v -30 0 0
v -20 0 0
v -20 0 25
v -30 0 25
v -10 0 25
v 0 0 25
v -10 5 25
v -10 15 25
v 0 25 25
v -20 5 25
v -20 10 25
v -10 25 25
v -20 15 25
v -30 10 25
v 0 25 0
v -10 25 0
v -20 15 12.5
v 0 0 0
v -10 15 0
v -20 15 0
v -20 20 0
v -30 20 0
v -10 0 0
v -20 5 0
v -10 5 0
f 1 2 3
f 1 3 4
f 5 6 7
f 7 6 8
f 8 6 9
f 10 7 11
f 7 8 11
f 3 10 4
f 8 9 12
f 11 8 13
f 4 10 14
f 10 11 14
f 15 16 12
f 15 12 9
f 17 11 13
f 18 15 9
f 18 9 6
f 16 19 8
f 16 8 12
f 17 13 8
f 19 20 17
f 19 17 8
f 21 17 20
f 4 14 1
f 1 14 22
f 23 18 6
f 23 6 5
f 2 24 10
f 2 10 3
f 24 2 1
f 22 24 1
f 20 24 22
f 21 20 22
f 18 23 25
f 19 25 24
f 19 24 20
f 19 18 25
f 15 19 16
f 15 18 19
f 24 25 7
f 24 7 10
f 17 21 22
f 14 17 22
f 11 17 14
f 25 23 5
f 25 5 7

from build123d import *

# Parameters (mm, degrees)
BOSS_EXTRUDE1_DEPTH = 25
BOSS_EXTRUDE2_DEPTH = 10


with BuildPart() as part:
    # Sketch1 → Boss-Extrude1 (new body)
    with BuildSketch(Plane.XY):
        Polygon((-30, 10), (-20, 10), (-20, 15), (-10, 15), (-10, 25), (0, 25), (0, 0), (-10, 0), (-10, 5), (-20, 5), (-20, 0), (-30, 0), align=None)
    extrude(amount=BOSS_EXTRUDE1_DEPTH)

    # Sketch2 → Boss-Extrude2 (add)
    with BuildSketch(Plane.ZY.offset(20)):
        Polygon((0, 10), (0, 20), (25, 10), align=None)
    extrude(amount=BOSS_EXTRUDE2_DEPTH)


solid = part.part
